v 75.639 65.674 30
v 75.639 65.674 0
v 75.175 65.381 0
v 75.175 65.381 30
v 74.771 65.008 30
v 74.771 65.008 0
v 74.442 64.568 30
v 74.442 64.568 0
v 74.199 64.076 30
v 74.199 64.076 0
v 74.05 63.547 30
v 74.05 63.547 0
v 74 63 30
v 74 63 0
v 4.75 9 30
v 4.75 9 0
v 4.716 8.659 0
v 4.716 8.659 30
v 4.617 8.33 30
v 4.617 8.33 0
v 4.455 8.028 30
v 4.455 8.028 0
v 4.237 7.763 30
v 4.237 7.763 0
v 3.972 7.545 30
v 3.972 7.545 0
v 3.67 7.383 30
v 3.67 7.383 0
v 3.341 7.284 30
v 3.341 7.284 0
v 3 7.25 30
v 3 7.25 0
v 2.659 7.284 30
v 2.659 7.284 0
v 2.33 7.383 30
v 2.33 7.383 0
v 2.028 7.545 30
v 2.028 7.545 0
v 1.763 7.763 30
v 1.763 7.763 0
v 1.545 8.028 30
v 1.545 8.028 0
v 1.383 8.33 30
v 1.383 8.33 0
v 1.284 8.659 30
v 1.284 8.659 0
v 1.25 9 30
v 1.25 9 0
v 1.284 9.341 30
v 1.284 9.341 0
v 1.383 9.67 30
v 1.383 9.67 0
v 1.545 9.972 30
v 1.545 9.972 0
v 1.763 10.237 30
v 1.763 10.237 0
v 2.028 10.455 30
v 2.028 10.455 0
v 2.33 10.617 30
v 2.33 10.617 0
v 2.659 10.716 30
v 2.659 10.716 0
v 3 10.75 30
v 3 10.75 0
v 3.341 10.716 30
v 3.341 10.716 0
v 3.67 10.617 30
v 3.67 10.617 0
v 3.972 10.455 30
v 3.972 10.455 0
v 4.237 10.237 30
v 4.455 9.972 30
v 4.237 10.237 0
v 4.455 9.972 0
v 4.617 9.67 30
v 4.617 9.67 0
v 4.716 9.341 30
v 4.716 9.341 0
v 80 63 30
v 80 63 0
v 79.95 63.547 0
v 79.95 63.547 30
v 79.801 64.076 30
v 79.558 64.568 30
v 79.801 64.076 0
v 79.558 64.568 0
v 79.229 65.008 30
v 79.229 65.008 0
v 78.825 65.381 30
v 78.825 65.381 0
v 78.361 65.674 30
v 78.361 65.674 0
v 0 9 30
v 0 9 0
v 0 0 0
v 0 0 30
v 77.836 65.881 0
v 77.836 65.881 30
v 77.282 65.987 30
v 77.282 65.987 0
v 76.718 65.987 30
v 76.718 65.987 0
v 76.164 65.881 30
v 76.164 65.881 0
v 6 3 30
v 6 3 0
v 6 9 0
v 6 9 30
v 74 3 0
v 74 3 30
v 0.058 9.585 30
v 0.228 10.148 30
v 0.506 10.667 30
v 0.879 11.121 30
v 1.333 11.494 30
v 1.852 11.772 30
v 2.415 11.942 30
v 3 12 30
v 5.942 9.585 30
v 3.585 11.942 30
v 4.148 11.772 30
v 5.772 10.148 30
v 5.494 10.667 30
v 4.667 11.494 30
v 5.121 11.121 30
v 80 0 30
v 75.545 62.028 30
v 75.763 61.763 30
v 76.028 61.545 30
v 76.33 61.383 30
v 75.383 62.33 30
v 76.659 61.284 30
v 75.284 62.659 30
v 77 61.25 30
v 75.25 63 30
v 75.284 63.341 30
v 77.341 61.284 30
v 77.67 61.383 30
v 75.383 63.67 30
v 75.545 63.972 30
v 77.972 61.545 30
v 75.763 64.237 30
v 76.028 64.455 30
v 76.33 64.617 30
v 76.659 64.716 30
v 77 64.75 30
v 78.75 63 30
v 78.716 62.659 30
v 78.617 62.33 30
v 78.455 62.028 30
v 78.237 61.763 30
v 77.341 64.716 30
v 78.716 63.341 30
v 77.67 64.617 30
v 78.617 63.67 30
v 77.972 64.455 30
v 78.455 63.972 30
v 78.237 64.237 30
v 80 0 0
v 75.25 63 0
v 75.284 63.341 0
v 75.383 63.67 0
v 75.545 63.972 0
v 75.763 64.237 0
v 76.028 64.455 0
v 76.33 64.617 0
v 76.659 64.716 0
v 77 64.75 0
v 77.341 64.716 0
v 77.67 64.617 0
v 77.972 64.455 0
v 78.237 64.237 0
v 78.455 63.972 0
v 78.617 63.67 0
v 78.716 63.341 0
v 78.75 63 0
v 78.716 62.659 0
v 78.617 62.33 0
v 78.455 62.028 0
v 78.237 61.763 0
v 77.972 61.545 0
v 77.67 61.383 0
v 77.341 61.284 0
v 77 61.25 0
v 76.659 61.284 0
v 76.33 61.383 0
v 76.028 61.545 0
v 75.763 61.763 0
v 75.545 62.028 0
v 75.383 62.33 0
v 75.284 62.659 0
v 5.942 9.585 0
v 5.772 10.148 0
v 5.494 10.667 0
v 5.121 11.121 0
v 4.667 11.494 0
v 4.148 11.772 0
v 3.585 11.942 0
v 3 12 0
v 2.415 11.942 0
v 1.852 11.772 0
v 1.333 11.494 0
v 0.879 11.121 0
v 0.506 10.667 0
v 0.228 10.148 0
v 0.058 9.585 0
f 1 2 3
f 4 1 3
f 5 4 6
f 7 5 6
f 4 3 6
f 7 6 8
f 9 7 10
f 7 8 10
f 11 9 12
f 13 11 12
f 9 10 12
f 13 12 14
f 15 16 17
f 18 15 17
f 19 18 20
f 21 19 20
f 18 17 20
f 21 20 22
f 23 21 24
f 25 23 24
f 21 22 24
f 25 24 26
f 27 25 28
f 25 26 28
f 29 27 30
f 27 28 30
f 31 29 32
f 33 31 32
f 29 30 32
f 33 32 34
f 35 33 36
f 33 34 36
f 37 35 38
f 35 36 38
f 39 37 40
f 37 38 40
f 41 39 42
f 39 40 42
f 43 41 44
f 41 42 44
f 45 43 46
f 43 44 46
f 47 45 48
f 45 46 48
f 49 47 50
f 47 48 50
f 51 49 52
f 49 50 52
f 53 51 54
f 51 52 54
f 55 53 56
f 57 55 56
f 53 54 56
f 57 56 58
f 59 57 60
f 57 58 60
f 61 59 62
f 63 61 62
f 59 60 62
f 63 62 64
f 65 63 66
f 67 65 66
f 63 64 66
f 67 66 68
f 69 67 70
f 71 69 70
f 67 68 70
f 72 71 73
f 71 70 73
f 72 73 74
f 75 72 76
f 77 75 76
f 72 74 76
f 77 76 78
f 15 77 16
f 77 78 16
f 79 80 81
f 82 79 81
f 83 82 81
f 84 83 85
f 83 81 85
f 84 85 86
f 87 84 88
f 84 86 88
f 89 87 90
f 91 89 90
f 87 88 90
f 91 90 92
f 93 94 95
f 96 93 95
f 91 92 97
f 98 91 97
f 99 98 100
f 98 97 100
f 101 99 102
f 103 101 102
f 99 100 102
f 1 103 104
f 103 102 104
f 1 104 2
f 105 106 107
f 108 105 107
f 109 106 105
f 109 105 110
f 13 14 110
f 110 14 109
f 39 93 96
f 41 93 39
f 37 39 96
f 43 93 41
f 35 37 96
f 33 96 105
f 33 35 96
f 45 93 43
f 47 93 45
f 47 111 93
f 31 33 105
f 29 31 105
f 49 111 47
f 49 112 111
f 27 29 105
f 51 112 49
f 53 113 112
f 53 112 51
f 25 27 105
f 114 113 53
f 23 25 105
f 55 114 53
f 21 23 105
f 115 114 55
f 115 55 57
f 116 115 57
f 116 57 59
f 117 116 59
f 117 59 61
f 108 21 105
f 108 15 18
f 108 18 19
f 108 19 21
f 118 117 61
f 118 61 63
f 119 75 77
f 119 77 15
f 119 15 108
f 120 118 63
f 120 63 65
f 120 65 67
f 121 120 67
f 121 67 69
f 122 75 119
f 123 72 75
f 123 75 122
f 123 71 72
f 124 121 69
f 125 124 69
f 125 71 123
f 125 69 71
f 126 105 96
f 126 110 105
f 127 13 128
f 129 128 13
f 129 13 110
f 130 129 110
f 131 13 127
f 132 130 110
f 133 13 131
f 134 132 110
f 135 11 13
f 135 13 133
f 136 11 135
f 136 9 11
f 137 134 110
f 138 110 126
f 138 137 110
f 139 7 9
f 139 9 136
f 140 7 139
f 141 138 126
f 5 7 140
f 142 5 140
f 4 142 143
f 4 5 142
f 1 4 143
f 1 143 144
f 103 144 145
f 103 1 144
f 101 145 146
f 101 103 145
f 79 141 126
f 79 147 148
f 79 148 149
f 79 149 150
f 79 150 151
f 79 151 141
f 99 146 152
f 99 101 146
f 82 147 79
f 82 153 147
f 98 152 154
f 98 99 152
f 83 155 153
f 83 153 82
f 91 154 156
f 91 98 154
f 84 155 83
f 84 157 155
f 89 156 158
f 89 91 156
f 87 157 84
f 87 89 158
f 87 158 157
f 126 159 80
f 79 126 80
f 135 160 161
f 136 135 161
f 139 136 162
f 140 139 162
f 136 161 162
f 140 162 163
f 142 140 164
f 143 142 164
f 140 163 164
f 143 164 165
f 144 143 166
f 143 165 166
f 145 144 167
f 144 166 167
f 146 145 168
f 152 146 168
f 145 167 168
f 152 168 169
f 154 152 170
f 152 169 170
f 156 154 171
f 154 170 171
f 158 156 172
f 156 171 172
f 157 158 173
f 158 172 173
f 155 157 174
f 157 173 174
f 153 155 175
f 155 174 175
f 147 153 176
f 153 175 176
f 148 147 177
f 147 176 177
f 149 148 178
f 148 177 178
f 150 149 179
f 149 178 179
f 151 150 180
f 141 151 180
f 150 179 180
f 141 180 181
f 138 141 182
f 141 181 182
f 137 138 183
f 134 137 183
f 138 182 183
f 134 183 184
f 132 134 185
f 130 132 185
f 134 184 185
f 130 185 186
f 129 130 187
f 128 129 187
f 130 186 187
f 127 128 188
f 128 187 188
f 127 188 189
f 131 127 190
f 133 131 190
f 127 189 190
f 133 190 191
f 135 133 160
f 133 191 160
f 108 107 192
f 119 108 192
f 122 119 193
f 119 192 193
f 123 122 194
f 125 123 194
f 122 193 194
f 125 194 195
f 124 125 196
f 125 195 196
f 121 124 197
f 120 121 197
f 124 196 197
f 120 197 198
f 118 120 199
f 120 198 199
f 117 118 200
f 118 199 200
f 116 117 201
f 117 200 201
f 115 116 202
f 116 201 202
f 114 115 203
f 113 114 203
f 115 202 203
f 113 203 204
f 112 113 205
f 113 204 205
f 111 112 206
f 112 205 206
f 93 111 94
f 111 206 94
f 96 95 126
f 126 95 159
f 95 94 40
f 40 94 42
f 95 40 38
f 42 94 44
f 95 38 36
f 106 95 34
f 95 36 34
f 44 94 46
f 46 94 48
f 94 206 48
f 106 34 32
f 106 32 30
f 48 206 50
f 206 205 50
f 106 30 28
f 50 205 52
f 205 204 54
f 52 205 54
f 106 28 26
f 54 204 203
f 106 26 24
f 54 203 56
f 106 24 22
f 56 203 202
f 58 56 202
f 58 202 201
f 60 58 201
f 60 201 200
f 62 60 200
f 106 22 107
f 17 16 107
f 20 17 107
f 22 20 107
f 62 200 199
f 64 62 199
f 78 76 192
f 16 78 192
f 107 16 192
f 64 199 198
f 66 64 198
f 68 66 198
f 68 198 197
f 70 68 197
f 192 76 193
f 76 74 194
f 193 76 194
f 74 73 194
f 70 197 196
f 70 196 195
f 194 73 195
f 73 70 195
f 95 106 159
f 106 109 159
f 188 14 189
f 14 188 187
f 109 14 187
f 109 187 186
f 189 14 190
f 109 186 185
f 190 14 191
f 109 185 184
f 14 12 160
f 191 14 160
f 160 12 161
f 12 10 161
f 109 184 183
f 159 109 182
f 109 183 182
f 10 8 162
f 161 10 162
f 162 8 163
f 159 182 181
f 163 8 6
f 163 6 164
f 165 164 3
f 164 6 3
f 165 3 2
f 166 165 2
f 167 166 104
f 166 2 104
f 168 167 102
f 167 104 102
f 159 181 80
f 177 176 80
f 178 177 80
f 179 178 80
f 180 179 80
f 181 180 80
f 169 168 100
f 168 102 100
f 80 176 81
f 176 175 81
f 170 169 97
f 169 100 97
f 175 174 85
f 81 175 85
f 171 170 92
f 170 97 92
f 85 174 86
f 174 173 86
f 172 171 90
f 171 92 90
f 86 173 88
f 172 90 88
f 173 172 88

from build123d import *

# Parameters (mm, degrees)
SKETCH1_W           = 80
SKETCH1_H           = 3
BOSS_EXTRUDE1_DEPTH = 30


with BuildPart() as part:
    # Sketch1 → Boss-Extrude1 (new body)
    with BuildSketch(Plane.XY):
        with BuildLine():
            Line((74, 3), (80, 3))
            Line((80, 3), (80, 63))
            ThreePointArc((80, 63), (77, 60), (74, 63))
            Line((74, 63), (74, 3))
        make_face()
        with BuildLine():
            Line((78.75, 63), (80, 63))
            ThreePointArc((80, 63), (79.557579886, 64.568051379), (78.360809916, 65.673611111))
            Line((78.360809916, 65.673611111), (75.639190084, 65.673611111))
            ThreePointArc((75.639190084, 65.673611111), (74.442420114, 64.568051379), (74, 63))
            Line((74, 63), (75.25, 63))
            ThreePointArc((75.25, 63), (77, 64.75), (78.75, 63))
        make_face()
        with BuildLine():
            ThreePointArc((74, 63), (77, 60), (80, 63))
            Line((80, 63), (78.75, 63))
            ThreePointArc((78.75, 63), (77, 61.25), (75.25, 63))
            Line((75.25, 63), (74, 63))
        make_face()
        with BuildLine():
            Line((75.639190084, 65.673611111), (78.360809916, 65.673611111))
            ThreePointArc((78.360809916, 65.673611111), (77, 66), (75.639190084, 65.673611111))
        make_face()
        with BuildLine():
            ThreePointArc((6, 9), (3, 12), (0, 9))
            Line((0, 9), (1.25, 9))
            ThreePointArc((1.25, 9), (3, 10.75), (4.75, 9))
            Line((4.75, 9), (6, 9))
        make_face()
        with BuildLine():
            Line((1.25, 9), (0, 9))
            ThreePointArc((0, 9), (3, 6), (6, 9))
            Line((6, 9), (4.75, 9))
            ThreePointArc((4.75, 9), (3, 7.25), (1.25, 9))
        make_face()
        with BuildLine():
            Line((0, 9), (0, 3))
            Line((0, 3), (6, 3))
            Line((6, 3), (6, 9))
            ThreePointArc((6, 9), (3, 6), (0, 9))
        make_face()
        with Locations((40, 1.5)):
            Rectangle(SKETCH1_W, SKETCH1_H)
    extrude(amount=BOSS_EXTRUDE1_DEPTH)


solid = part.part
